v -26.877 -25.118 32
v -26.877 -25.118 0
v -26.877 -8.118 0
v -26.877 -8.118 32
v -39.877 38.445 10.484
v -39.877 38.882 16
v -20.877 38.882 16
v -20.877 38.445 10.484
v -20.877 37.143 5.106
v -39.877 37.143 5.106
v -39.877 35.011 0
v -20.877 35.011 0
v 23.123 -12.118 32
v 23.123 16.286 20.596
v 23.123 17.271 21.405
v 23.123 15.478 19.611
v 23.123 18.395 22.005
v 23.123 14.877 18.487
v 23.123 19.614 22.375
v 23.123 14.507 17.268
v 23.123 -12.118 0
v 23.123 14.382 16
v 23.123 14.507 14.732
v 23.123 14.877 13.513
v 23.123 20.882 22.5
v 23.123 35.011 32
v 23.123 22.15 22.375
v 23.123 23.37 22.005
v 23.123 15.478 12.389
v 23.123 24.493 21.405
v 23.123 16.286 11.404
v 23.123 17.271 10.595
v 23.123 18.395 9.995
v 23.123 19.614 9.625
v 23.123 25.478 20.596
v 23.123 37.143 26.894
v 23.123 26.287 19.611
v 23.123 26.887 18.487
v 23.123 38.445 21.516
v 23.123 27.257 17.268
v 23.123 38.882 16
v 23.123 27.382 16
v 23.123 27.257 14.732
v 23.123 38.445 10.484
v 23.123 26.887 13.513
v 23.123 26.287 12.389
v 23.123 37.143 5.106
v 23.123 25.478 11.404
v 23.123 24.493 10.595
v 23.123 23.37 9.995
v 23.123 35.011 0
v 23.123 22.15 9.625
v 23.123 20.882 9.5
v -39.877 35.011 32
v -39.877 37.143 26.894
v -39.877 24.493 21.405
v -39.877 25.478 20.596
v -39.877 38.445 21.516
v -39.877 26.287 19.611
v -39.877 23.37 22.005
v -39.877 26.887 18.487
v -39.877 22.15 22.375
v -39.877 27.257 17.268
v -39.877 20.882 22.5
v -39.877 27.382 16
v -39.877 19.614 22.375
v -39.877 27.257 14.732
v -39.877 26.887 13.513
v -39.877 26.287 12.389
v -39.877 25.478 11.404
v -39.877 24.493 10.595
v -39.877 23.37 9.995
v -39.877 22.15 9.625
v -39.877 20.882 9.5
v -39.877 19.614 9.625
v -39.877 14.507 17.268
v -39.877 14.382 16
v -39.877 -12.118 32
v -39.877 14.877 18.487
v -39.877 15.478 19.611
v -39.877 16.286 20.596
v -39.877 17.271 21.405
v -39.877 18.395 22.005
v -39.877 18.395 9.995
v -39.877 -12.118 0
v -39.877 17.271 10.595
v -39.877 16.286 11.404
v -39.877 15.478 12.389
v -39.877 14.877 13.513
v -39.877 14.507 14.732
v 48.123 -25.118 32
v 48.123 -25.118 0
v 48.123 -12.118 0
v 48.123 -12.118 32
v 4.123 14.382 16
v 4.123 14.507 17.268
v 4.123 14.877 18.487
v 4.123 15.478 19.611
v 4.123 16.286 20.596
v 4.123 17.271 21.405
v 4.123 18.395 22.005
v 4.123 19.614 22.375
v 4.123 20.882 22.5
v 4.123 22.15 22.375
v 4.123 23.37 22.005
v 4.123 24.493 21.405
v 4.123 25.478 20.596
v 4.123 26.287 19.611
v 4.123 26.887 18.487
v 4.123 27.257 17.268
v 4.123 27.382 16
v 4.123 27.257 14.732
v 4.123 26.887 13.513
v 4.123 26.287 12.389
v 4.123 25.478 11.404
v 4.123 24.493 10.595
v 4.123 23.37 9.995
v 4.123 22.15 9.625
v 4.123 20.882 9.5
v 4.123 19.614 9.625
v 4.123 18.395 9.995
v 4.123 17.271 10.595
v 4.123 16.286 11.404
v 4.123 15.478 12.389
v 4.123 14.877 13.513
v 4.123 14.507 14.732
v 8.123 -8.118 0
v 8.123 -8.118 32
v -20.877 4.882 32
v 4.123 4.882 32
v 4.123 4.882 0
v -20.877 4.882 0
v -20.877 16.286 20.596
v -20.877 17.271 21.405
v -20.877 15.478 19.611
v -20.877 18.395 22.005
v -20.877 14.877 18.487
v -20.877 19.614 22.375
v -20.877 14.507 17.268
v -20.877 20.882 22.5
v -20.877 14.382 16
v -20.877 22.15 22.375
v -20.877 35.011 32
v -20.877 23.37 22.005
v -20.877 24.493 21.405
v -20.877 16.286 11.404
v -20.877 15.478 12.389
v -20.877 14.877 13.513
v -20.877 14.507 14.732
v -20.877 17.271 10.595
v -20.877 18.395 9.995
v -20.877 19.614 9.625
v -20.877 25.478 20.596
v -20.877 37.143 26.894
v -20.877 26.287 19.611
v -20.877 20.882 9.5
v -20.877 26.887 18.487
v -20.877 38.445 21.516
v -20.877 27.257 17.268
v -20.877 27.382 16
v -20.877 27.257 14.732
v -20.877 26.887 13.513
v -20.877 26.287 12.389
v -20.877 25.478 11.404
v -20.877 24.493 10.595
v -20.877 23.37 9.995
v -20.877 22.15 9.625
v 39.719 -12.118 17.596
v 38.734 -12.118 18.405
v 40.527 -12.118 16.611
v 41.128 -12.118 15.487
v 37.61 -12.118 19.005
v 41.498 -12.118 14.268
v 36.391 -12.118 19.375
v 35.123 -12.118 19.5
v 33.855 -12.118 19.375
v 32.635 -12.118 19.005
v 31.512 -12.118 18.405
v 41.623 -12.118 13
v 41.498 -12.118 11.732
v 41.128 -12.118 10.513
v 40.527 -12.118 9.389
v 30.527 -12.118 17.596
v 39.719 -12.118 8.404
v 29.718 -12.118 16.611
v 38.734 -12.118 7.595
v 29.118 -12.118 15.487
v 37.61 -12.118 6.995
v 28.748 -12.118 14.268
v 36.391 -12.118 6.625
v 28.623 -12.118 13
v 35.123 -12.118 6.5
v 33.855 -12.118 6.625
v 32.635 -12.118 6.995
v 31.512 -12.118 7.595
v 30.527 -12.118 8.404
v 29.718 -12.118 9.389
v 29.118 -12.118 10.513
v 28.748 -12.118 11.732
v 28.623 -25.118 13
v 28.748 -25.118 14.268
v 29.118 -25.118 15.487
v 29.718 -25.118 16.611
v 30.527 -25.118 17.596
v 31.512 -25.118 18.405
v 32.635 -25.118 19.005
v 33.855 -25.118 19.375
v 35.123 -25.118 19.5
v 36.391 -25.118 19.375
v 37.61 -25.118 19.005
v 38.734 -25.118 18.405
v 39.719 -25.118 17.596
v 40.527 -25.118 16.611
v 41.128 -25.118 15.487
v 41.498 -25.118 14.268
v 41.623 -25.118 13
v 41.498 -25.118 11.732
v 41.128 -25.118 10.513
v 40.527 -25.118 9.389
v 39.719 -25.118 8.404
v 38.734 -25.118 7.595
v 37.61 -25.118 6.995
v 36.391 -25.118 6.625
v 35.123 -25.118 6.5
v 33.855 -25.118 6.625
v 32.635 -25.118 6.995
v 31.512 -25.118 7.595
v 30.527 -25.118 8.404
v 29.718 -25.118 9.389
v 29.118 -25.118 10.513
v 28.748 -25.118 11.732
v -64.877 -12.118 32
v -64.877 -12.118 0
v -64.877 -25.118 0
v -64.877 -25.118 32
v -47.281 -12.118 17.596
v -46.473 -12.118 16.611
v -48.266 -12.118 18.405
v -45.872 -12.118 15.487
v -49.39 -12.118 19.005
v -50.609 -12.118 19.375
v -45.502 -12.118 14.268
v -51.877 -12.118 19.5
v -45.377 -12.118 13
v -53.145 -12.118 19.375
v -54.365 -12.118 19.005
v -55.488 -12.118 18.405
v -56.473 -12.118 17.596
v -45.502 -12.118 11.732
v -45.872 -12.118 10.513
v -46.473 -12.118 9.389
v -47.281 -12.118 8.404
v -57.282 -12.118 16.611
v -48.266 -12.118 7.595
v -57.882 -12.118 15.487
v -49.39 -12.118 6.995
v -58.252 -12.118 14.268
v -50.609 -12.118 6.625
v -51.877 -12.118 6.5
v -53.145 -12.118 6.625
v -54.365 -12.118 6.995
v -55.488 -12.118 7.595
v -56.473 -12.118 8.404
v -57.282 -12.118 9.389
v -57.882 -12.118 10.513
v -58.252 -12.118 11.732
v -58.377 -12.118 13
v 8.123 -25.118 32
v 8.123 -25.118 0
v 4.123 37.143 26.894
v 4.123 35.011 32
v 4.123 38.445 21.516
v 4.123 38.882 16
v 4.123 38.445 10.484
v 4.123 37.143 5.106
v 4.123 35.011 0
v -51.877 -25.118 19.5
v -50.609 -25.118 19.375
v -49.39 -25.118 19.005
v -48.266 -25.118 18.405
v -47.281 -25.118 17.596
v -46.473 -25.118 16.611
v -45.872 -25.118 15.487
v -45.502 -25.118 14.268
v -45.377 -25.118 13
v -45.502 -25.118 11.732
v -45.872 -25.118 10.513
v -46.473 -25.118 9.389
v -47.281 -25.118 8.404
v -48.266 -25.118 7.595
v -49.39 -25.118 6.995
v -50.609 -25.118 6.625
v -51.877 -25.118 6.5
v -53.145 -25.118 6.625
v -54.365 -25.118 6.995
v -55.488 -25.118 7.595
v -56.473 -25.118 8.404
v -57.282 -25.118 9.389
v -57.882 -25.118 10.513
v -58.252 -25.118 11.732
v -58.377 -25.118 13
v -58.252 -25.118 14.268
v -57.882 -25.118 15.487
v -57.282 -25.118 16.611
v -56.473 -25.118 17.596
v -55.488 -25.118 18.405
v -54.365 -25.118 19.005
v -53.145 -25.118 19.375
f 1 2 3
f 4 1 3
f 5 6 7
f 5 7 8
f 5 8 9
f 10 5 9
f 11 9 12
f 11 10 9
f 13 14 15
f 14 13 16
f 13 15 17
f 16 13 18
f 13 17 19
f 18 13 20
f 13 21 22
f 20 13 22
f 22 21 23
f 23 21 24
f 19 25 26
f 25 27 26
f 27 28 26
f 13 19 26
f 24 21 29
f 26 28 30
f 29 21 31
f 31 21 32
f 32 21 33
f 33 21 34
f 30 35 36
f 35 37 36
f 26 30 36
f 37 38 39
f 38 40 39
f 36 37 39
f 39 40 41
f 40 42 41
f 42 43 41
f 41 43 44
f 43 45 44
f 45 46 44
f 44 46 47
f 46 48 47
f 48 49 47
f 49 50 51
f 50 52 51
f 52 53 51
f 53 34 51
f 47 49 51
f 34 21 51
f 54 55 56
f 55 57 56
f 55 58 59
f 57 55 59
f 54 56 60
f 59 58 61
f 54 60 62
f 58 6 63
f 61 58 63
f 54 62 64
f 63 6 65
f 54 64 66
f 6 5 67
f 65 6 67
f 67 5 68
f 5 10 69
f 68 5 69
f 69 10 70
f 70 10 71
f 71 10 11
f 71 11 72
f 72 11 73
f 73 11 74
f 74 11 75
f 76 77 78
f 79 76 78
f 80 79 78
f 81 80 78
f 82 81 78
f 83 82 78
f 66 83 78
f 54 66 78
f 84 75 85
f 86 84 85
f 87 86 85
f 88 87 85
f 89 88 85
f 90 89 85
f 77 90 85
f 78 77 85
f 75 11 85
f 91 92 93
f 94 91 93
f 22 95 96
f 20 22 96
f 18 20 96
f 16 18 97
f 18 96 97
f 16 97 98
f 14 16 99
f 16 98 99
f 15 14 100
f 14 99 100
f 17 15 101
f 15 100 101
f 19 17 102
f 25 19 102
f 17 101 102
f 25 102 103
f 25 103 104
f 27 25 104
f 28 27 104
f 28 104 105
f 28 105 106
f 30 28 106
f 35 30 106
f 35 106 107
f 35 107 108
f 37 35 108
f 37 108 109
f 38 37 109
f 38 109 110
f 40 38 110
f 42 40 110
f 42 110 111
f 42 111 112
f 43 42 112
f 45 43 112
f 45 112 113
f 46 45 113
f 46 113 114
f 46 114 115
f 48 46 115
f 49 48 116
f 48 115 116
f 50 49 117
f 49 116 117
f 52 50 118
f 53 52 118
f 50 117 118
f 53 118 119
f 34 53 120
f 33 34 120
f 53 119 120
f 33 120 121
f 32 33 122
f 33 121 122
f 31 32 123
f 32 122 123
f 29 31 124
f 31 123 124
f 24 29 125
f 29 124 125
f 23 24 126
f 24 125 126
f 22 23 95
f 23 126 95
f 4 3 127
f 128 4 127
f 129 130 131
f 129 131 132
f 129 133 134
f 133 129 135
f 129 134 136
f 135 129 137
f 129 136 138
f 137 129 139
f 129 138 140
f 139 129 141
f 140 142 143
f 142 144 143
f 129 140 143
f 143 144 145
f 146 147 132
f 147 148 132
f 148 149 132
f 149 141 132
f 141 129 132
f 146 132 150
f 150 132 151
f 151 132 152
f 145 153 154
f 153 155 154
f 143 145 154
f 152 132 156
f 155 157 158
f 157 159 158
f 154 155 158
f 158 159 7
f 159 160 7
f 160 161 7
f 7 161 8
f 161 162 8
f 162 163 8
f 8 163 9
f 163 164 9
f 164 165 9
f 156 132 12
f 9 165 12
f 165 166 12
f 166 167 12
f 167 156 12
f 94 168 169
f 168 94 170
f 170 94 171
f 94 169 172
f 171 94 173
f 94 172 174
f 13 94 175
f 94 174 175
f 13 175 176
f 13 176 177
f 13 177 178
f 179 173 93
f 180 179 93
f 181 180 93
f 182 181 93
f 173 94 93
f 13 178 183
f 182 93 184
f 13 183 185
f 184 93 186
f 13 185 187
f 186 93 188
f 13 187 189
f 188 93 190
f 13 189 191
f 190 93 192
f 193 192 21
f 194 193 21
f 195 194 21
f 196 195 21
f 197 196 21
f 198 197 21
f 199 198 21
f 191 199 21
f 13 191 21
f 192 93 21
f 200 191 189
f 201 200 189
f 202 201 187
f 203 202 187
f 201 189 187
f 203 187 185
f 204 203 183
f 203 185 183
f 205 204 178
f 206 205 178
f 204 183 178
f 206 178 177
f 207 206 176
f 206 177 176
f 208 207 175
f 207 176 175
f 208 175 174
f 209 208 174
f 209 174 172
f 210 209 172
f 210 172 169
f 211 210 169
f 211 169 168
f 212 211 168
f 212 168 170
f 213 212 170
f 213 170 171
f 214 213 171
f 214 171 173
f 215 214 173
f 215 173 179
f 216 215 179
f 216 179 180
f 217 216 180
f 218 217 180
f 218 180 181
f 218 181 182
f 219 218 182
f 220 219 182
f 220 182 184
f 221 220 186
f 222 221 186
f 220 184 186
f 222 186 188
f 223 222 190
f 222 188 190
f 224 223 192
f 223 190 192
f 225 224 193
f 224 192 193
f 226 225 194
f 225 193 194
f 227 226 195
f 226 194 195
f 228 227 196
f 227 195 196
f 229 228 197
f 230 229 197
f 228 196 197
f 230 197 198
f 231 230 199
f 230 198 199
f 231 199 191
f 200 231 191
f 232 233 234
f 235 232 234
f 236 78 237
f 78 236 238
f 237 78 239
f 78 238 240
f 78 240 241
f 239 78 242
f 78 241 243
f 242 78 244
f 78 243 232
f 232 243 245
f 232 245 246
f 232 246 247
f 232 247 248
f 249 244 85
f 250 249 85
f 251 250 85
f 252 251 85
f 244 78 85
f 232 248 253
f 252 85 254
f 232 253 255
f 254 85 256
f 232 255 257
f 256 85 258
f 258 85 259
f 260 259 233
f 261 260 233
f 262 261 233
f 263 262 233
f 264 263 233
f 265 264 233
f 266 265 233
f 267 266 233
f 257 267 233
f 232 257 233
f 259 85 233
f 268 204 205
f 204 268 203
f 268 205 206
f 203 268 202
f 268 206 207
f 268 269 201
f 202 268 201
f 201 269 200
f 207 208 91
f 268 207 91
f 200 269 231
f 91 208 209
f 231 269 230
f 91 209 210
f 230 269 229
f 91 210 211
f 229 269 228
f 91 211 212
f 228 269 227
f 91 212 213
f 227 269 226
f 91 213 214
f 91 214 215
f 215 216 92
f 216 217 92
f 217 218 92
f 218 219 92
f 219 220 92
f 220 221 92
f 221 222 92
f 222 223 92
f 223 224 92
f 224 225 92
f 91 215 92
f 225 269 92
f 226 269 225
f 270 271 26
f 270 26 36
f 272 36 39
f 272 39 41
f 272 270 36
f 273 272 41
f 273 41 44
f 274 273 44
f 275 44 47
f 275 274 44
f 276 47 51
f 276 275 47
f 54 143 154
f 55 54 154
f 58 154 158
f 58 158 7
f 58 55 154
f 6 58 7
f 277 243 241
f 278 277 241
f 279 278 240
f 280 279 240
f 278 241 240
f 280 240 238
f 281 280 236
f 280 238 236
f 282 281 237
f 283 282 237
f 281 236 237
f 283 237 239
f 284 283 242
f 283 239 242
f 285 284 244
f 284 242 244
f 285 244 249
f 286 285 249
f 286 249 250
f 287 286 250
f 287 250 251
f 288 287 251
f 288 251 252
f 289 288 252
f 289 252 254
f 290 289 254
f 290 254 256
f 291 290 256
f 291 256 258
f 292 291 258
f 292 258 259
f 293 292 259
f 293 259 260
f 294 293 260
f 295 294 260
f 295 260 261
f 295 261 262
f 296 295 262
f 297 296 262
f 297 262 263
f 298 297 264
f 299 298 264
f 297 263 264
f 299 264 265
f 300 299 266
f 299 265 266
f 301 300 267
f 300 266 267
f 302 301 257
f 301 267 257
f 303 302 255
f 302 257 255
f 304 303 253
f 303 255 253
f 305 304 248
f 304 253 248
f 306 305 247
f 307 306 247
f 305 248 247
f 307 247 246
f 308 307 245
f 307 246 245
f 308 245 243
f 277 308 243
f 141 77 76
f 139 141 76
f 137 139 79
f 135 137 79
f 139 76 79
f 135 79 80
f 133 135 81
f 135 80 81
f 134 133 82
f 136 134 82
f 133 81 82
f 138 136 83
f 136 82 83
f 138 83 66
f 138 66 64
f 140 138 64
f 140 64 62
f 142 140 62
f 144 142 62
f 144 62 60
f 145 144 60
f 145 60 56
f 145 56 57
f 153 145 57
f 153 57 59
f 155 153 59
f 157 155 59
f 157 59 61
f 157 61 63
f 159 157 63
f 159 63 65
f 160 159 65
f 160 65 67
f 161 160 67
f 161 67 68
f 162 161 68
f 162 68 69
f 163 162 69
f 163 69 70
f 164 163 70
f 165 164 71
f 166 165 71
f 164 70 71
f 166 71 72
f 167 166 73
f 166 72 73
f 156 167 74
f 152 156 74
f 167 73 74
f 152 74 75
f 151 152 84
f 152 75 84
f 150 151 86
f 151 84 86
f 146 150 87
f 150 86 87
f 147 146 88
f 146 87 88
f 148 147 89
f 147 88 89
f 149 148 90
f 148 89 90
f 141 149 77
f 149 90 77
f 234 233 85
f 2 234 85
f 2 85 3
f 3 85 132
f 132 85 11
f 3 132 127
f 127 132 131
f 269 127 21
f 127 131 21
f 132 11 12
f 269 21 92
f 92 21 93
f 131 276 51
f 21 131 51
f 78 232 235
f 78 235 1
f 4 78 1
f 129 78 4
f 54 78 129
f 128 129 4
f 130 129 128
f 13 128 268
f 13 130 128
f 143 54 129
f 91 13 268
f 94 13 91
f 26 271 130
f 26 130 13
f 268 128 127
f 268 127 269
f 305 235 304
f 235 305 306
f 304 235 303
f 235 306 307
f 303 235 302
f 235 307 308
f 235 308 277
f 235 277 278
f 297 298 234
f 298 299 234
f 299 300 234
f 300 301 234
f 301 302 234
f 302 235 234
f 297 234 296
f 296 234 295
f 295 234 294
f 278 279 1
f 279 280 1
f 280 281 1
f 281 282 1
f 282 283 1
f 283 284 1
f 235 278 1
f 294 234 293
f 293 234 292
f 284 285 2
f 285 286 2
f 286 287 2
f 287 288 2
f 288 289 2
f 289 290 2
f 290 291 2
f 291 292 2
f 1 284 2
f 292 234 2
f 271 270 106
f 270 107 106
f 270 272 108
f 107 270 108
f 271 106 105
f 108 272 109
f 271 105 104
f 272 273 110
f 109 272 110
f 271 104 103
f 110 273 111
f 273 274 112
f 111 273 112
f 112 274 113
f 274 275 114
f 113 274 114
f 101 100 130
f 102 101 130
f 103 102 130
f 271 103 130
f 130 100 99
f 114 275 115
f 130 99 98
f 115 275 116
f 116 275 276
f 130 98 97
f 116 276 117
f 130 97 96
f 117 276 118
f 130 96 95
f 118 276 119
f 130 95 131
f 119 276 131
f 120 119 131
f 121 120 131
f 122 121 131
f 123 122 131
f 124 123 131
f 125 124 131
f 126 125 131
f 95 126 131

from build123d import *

# Parameters (mm, degrees)
BOSS_EXTRUDE1_DEPTH = 32
SKETCH2_R           = 6.5
CUT_EXTRUDE1_DEPTH  = 32
SKETCH3_R           = 6.5
CUT_EXTRUDE2_DEPTH  = 76
CUT_EXTRUDE5_START  = -63
CUT_EXTRUDE5_DEPTH  = 63


# Read off the part's stored shape, not the designer's step: Cut-Extrude5
with BuildPart() as part:
    # Sketch1 → Boss-Extrude1 (new body)
    with BuildSketch(Plane.XY):
        Polygon((-64.877213136, -12.117917581), (-64.877213136, -25.117917581), (-26.877213136, -25.117917581), (-26.877213136, -8.117917581), (8.122786864, -8.117917581), (8.122786864, -25.117917581), (48.122786864, -25.117917581), (48.122786864, -12.117917581), (23.122786864, -12.117917581), (23.122786864, 38.882082419), (4.122786864, 38.882082419), (4.122786864, 4.882082419), (-20.877213136, 4.882082419), (-20.877213136, 38.882082419), (-39.877213136, 38.882082419), (-39.877213136, -12.117917581), align=None)
    extrude(amount=BOSS_EXTRUDE1_DEPTH)

    # Sketch2 → Cut-Extrude1 (cut)
    with BuildSketch(Plane(origin=(0, -12.117917581, 0), x_dir=(1, 0, 0), z_dir=(0, 1, 0))):
        with Locations(Location((35.122786864, -13, 0), (0, 0, 180))):
            Circle(SKETCH2_R)
        with Locations(Location((-51.877213136, -13, 0), (0, 0, 270))):
            Circle(SKETCH2_R)
    extrude(amount=-CUT_EXTRUDE1_DEPTH, mode=Mode.SUBTRACT)

    # Sketch3 → Cut-Extrude2 (cut)
    with BuildSketch(Plane.ZY.offset(39.877213136)):
        with Locations(Location((16, 20.882082419, 0), (0, 0, 270))):
            Circle(SKETCH3_R)
    extrude(amount=-CUT_EXTRUDE2_DEPTH, mode=Mode.SUBTRACT)

    # Cut-Extrude5 outline → Cut-Extrude5 (cut)
    with BuildSketch(Plane(origin=(23.122786864, 0, 0), x_dir=(0, 0, -1), z_dir=(1, 0, 0)).offset(CUT_EXTRUDE5_START)):
        with BuildLine():
            ThreePointArc((-32, 35.010847251), (-24.230833216, 37.900509551), (-16, 38.882082419))
            Line((-16, 38.882082419), (-32, 38.882082419))
            Line((-32, 38.882082419), (-32, 35.010847251))
        make_face()
        with BuildLine():
            ThreePointArc((-16, 38.882082419), (-7.769166784, 37.900509551), (0, 35.010847251))
            Line((0, 35.010847251), (0, 38.882082419))
            Line((0, 38.882082419), (-16, 38.882082419))
        make_face()
    extrude(amount=CUT_EXTRUDE5_DEPTH, mode=Mode.SUBTRACT)


solid = part.part
